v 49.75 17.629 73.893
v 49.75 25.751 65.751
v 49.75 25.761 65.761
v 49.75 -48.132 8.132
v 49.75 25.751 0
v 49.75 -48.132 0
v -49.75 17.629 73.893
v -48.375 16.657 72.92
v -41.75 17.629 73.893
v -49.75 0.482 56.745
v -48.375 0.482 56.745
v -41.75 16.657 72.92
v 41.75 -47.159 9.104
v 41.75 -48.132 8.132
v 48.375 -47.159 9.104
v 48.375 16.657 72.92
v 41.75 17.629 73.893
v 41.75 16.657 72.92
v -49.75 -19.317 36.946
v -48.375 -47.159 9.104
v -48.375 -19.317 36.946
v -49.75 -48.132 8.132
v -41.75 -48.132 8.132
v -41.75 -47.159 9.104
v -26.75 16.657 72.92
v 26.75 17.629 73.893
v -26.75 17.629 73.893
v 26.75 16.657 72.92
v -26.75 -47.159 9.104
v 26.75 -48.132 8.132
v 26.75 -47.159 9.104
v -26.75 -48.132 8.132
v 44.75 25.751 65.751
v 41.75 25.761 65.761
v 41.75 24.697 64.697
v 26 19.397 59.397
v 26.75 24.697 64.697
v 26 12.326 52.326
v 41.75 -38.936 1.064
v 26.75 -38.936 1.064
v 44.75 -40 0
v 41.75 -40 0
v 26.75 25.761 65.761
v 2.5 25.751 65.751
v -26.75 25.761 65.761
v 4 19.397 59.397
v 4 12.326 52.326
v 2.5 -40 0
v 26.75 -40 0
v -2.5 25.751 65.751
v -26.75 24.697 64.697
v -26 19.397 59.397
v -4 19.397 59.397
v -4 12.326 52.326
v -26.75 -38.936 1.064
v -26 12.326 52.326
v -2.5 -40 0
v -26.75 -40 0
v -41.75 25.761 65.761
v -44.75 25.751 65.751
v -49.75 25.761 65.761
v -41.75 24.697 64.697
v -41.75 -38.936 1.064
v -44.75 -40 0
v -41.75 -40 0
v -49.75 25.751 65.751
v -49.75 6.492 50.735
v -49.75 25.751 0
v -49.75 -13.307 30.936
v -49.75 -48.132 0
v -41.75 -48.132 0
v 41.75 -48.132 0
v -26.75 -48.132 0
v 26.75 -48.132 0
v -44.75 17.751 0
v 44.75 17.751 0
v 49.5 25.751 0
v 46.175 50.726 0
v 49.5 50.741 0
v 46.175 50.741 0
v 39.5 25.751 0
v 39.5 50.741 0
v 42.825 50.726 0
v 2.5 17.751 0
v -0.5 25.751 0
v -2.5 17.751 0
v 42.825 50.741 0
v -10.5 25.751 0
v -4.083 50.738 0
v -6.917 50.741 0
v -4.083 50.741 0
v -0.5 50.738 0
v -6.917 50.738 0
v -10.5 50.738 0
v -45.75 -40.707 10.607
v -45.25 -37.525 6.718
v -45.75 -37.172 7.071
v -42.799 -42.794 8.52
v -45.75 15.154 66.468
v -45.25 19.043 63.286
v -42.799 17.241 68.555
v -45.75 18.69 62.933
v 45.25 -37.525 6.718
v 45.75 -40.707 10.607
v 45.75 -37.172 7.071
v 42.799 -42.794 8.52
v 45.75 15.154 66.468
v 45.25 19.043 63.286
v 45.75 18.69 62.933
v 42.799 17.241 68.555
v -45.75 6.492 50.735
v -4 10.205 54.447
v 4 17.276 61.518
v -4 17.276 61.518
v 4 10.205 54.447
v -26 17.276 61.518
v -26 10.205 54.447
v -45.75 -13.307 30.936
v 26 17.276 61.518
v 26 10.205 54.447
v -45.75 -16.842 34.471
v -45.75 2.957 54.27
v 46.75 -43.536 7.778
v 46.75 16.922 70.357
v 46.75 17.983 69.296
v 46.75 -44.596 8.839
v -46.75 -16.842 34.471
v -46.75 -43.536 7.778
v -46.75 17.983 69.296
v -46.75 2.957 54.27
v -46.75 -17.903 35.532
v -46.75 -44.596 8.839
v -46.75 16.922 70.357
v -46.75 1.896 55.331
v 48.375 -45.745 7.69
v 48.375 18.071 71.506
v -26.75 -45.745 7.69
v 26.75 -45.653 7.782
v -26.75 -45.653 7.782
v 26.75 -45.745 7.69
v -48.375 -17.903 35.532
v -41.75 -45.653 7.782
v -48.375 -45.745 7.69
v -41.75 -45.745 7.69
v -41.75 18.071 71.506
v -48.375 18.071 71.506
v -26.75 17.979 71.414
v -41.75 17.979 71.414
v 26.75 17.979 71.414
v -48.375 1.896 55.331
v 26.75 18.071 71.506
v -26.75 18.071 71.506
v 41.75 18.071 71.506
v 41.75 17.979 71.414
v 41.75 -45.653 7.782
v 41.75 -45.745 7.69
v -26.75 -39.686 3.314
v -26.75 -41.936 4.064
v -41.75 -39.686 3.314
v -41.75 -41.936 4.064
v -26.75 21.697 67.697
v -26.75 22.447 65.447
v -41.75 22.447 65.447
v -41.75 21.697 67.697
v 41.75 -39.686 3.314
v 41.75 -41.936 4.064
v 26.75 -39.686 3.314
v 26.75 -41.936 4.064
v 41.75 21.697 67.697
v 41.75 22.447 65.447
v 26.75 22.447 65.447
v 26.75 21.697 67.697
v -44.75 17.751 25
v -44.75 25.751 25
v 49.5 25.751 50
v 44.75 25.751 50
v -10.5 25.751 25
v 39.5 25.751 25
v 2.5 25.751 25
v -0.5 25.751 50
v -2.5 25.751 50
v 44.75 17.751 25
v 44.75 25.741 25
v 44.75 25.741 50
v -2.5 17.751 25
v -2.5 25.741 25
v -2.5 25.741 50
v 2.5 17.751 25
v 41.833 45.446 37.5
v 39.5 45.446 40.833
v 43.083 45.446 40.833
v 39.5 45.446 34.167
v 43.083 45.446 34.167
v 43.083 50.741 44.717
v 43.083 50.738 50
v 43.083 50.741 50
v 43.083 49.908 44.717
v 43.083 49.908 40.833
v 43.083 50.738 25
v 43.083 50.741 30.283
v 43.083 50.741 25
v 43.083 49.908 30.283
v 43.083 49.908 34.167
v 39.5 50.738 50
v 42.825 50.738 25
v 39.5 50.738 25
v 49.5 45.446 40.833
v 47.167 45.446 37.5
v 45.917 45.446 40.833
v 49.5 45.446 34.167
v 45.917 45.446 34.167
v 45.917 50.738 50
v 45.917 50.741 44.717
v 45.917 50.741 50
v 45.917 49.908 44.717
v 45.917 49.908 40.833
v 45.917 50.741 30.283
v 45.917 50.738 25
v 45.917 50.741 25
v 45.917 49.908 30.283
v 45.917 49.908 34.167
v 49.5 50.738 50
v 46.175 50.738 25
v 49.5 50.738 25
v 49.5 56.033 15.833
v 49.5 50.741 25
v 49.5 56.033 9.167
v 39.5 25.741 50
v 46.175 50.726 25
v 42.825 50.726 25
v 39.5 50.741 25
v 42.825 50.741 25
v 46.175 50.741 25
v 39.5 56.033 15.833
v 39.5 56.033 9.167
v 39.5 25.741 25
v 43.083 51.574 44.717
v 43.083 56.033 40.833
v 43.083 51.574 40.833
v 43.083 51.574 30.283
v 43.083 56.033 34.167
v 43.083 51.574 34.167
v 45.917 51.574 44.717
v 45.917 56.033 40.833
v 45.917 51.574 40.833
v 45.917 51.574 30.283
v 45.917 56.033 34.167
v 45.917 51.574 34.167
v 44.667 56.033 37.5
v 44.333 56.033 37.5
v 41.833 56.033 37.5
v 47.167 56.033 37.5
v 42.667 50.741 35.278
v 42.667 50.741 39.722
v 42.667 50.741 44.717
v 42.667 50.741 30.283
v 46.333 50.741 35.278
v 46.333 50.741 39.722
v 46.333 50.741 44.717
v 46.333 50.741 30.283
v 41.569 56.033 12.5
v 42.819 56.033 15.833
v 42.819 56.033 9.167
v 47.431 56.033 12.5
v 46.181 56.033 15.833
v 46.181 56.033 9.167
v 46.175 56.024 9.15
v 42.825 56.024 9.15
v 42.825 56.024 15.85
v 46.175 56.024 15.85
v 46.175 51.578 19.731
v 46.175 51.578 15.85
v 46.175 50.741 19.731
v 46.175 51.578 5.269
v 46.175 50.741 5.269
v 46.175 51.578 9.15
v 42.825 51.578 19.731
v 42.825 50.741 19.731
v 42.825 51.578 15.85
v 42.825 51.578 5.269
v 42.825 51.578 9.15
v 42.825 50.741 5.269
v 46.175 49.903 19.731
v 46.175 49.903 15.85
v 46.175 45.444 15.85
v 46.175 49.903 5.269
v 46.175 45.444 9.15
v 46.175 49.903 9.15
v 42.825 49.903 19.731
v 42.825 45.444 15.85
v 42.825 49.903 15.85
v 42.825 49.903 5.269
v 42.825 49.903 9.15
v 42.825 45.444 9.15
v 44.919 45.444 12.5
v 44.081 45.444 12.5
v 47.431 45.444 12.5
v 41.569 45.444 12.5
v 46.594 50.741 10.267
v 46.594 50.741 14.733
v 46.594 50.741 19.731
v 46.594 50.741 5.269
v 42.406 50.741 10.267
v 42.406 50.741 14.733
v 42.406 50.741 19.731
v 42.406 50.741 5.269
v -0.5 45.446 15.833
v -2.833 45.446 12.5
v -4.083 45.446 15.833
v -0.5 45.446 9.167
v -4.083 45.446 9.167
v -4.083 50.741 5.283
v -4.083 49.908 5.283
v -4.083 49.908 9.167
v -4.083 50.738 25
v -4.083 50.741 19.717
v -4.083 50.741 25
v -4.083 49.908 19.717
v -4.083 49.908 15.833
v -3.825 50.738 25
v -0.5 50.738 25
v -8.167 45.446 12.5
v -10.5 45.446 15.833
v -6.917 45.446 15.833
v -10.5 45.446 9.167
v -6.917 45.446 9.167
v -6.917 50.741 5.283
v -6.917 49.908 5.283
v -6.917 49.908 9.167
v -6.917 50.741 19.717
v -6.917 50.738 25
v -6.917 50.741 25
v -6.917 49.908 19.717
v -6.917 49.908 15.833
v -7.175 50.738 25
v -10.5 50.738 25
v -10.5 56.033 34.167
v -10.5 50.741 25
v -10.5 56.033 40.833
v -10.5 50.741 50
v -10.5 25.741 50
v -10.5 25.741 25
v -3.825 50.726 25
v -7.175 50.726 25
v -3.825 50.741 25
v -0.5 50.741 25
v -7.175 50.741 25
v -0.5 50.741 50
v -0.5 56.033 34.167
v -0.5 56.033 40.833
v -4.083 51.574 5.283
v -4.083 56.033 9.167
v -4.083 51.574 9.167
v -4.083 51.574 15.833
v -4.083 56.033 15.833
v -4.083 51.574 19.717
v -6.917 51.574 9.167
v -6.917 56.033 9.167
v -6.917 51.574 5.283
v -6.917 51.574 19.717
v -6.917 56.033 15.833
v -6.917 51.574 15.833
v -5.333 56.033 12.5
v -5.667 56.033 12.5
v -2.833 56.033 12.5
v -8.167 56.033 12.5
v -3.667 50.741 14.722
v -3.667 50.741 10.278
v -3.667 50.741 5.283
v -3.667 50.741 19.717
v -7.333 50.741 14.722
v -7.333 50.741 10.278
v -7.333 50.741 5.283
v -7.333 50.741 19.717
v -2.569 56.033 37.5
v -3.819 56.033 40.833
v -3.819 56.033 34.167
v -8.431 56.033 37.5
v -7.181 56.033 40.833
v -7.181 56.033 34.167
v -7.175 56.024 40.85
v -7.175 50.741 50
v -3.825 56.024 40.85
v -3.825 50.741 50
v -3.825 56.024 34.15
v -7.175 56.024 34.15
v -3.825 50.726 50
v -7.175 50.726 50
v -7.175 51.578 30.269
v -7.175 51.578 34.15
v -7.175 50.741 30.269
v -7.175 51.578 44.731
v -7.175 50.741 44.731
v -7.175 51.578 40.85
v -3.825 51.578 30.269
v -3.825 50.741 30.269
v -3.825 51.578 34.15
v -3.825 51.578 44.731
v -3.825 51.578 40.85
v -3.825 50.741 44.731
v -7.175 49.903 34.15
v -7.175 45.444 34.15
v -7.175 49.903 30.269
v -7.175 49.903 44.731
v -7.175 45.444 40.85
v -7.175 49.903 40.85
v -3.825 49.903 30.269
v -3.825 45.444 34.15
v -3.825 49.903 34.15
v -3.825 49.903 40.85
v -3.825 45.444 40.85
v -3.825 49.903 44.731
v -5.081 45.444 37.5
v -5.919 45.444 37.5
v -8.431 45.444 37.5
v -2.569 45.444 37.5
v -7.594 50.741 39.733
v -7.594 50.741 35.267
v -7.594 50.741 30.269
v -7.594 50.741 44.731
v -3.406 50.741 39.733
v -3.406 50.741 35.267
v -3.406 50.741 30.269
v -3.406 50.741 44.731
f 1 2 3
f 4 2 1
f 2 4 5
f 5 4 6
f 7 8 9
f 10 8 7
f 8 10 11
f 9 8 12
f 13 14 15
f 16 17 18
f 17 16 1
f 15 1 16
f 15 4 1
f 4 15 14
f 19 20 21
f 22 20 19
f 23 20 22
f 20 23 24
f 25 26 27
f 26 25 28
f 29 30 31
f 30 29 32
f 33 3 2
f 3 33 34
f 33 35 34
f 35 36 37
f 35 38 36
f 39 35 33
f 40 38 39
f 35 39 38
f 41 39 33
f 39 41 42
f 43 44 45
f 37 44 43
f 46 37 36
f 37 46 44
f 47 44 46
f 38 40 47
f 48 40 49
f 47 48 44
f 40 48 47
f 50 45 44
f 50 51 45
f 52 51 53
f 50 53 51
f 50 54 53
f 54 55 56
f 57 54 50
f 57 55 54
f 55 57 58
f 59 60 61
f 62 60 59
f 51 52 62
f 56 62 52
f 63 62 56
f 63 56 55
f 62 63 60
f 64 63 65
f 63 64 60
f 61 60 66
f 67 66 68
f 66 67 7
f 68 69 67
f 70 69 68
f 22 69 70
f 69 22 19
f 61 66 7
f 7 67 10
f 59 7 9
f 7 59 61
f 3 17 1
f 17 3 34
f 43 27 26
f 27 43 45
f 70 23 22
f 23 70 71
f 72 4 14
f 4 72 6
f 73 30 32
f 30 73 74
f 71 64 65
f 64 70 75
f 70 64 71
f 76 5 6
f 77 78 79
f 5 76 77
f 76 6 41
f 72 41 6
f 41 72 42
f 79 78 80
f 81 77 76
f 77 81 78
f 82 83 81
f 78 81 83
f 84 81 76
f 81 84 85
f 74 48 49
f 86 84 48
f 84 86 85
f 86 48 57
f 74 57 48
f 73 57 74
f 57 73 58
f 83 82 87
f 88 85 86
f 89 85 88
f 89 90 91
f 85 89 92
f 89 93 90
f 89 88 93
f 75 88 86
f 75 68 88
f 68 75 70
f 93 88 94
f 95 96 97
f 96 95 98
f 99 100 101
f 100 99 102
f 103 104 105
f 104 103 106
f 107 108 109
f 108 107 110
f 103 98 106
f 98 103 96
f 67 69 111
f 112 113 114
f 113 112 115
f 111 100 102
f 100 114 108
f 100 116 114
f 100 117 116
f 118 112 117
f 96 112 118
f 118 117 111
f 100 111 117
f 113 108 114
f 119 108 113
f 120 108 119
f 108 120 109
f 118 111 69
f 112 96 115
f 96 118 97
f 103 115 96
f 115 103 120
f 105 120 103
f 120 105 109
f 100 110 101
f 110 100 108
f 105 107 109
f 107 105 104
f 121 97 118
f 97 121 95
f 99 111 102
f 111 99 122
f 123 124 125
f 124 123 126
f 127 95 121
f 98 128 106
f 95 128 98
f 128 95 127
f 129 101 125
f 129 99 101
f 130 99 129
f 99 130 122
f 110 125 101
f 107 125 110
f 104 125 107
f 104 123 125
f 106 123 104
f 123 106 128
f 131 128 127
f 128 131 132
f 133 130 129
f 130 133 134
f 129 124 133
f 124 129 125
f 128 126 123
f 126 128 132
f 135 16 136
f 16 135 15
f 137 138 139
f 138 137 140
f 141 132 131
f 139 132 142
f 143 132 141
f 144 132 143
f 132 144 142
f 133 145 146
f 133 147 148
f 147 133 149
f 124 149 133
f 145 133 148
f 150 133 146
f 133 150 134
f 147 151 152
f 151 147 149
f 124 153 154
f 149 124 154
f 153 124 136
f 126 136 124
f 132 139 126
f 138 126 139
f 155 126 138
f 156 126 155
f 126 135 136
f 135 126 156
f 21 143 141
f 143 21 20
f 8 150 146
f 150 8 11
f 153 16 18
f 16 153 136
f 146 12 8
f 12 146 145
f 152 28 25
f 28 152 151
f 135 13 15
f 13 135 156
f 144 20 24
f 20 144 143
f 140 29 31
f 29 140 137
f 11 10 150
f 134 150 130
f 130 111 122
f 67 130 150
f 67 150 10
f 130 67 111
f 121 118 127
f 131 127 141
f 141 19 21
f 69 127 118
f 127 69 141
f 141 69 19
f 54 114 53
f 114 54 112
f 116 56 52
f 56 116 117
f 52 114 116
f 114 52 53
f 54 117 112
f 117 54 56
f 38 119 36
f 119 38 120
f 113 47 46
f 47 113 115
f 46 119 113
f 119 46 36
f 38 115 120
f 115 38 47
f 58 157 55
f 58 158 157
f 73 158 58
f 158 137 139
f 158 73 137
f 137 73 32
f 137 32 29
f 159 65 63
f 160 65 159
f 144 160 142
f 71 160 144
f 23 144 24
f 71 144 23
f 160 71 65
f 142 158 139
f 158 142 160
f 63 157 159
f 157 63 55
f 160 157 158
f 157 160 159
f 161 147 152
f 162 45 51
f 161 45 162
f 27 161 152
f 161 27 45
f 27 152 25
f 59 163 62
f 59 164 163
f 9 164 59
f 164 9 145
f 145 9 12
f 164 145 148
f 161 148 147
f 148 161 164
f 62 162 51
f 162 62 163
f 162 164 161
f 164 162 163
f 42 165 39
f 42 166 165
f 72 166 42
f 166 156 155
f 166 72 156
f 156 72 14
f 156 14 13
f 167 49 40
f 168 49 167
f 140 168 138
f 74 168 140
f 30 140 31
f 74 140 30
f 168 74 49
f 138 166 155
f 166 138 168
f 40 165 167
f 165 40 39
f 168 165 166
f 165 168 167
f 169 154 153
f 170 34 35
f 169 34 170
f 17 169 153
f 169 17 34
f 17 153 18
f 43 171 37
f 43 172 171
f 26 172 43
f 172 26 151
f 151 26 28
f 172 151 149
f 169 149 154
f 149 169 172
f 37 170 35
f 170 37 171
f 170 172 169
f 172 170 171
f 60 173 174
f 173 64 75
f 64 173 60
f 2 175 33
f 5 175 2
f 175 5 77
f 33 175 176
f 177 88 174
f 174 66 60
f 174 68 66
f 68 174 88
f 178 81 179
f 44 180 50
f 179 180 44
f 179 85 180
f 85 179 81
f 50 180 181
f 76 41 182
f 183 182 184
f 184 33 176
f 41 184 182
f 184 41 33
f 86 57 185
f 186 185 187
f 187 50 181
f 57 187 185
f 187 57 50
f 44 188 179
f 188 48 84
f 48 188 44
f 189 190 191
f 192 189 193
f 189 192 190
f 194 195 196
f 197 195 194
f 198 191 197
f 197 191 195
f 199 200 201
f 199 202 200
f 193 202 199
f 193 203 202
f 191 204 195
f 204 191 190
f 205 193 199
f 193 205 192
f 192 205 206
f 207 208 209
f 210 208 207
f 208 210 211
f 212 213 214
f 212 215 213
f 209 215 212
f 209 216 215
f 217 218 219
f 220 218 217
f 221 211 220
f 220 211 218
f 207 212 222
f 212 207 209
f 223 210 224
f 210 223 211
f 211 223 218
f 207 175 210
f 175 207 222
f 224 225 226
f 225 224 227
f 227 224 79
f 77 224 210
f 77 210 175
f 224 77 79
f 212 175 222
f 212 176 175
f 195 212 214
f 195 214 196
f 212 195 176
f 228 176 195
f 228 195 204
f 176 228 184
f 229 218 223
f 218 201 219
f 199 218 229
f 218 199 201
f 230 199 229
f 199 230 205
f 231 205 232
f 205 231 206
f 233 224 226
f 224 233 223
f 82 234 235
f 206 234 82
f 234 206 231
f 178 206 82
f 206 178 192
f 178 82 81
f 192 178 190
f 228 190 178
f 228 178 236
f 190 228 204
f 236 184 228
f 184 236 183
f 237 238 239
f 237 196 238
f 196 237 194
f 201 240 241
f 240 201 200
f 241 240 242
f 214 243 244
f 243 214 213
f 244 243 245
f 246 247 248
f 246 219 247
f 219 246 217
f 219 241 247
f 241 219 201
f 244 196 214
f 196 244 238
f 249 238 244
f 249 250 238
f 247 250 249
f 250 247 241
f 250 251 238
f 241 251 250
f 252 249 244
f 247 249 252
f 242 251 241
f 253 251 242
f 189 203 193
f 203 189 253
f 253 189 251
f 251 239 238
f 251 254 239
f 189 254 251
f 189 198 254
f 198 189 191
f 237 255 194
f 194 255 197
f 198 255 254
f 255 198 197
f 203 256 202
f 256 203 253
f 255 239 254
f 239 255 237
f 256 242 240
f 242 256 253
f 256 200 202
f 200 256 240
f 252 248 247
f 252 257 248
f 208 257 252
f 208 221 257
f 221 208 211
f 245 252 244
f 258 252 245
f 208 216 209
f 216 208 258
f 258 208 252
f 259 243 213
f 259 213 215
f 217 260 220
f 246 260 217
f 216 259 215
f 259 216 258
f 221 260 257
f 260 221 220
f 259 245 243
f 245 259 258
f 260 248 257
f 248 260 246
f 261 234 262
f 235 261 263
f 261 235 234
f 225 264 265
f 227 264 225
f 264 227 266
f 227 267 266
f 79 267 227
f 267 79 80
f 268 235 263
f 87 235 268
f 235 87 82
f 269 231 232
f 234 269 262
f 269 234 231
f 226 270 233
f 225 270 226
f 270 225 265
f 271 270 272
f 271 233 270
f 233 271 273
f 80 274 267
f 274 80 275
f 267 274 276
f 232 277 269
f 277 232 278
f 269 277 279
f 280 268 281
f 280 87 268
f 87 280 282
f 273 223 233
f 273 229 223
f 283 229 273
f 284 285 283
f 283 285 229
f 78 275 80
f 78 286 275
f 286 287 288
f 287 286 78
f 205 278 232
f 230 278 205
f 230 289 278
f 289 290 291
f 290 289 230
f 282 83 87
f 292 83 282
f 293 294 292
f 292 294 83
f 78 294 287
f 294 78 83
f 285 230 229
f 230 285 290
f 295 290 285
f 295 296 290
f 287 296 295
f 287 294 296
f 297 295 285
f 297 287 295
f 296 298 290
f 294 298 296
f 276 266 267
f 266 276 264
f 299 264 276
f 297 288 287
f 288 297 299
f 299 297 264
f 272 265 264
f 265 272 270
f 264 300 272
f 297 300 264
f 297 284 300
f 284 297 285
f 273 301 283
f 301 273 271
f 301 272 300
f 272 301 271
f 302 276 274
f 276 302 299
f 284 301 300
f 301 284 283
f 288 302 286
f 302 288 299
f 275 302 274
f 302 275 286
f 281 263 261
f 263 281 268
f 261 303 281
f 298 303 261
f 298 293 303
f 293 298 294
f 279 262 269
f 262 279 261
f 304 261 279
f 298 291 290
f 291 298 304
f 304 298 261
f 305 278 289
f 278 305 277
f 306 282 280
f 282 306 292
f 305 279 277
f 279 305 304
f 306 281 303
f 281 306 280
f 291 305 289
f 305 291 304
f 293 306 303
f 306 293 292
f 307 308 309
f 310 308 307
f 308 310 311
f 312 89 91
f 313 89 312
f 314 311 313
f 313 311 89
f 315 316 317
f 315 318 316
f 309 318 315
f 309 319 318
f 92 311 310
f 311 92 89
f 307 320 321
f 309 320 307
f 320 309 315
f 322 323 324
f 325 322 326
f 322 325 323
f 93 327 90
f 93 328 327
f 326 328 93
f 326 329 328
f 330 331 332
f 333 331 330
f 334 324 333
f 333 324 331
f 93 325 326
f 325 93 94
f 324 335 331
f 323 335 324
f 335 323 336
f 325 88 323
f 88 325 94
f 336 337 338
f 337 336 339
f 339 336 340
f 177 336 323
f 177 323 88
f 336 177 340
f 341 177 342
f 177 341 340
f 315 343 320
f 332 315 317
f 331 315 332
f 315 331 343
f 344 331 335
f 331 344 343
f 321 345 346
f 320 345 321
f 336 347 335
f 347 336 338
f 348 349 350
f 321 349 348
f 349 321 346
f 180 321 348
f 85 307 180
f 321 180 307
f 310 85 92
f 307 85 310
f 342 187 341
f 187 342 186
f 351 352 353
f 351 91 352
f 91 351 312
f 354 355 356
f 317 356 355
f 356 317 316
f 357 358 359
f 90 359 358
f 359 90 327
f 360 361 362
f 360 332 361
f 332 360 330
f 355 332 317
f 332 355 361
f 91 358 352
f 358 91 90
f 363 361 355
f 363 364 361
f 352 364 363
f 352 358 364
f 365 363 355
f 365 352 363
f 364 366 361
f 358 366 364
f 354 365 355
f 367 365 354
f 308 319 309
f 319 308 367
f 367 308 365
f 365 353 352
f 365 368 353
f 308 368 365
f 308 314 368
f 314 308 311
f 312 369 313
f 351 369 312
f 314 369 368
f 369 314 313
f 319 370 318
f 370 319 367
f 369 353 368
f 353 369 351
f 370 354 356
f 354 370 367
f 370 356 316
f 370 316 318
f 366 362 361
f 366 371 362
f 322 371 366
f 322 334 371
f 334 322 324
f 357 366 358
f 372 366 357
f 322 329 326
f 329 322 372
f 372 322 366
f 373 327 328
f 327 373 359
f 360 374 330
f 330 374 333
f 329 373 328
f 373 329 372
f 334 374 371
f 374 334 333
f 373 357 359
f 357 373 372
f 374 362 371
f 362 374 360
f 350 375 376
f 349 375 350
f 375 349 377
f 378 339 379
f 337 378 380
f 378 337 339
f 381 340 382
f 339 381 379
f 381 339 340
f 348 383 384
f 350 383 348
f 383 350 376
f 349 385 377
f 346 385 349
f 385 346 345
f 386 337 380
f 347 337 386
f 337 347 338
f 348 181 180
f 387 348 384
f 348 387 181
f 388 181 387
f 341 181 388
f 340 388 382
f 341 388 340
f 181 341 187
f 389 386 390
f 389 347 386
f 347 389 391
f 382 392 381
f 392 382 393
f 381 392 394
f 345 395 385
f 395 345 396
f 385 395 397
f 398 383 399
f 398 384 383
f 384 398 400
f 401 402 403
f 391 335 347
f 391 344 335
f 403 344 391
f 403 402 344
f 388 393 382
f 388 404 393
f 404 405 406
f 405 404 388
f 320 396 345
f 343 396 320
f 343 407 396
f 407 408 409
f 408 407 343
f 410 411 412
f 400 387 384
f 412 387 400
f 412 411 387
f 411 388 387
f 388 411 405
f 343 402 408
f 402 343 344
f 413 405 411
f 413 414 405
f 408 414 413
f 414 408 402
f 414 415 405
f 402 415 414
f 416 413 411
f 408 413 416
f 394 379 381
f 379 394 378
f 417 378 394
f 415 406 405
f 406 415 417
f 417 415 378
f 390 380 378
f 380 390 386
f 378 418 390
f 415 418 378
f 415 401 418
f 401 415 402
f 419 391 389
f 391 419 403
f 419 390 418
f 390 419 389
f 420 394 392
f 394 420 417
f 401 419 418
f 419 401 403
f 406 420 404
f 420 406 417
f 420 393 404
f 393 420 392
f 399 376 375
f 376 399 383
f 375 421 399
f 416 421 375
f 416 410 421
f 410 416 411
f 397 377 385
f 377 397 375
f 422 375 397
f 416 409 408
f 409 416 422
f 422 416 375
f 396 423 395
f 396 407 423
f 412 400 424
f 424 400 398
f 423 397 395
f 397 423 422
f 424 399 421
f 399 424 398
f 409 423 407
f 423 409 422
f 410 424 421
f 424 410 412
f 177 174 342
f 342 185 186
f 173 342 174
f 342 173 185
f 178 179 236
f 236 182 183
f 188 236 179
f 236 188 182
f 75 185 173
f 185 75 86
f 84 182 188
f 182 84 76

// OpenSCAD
include <config.scad>
use <GDMUtils.scad>
use <joiners.scad>


case_wall = 3;

// LCD display
lcd_width = 79;
lcd_height = 52;
lcd_hoff = 0;
lcd_voff = 8.25;

// SD card slot (left side)
sd_slot_width = 28;
sd_slot_height = 5;
sd_slot_voff = 8.25;

// Full board
board_width = 93.5;
board_height = 87;
board_depth = 10;
board_thick = 1.5;
board_top_clearance = 10;
board_top_standoff = 4.5;
board_bot_standoff = 0;

// Connectors
conn_slot_width = 52;
conn_slot_height = 10;
conn_slot_gap = 8;
conn_slot_voff = 32.5;
conn_slot_hoff = 0;

// Control Dial
dial_diam = 8;
dial_height = 7;
dial_voff = -35.25;
dial_hoff = 36.5;

// Buzzer
buzzer_diam = 2;
buzzer_height = 9.5;
buzzer_voff = -35.25;
buzzer_hoff = 19;

// Reset
reset_diam = 6;
reset_height = 5;
reset_voff = -35.5;
reset_hoff = 3.5;


$fa = 2;
$fs = 1.5;


module reset_button(slop=0) {
	h = board_top_clearance + case_wall - reset_height + slop;
	up(h+1) {
		zflip() {
			cylinder(d=reset_diam+2+slop, h=h-3, center=false);
			cylinder(d=reset_diam+slop, h=h+1, center=false);
			up(h-3) cylinder(d1=reset_diam+2+slop, d2=reset_diam+slop, h=2, center=false);
		}
	}
}
//!reset_button();


module rrd_graphic_lcd_case_top()
{
	tab_h = sd_slot_height + case_wall + board_thick + 2;
	h = board_top_clearance + case_wall;

	difference() {
		union() {
			difference() {
				// Outer shell.
				union() {
					upcube([board_width+case_wall*2, board_height+case_wall*2, h-2]);
					upcube([board_width+case_wall-printer_slop, board_height+case_wall-printer_slop, h]);

					// SD slot backing
					back(sd_slot_voff) {
						right(board_width/2+case_wall/2) {
							upcube([case_wall, sd_slot_width-printer_slop*2, h]);
						}
					}
				}
				up(case_wall) {
					// Board supports
					difference() {
						upcube([board_width, board_height, h]);
						xspread(board_width) {
							yspread(board_height) {
								chamfer_mask_z(l=h*3, chamfer=4.0);
							}
						}
					}
					xspread(board_width-4) {
						// Clear upper standoff corners
						up(board_top_clearance-board_top_standoff-0.01) {
							back(board_height/2-4/2) {
								upcube([4, 4, h]);
							}
						}

						// Clear lower standoff corners
						up(board_top_clearance-board_bot_standoff-0.01) {
							fwd(board_height/2-4/2) {
								upcube([4, 4, h]);
							}
						}
					}
				}

				// LCD access
				back(lcd_voff) {
					right(lcd_hoff) {
						cube([lcd_width, lcd_height, h*2], center=true);
					}
				}
			}

			// Clip tabs
			up(h-2-0.01) {
				xspread(board_width-15-2*5) {
					yflip_copy() {
						fwd((board_height+case_wall-0.01)/2) {
							fwd(case_wall/2/2) down(0.5) upcube([15-0.5, case_wall/2, tab_h]);
							up(tab_h - case_wall*sqrt(2)/2) {
								yscale(0.5) {
									xrot(45) cube([15-0.5, case_wall, case_wall], center=true);
								}
							}
						}
					}
				}
			}

			// Rotary dial support
			left(dial_hoff) {
				back(dial_voff) {
					up(case_wall-0.01) {
						cylinder(d=dial_diam+4, h=board_top_clearance-dial_height, center=false);
					}
				}
			}

			// Reset button support
			left(reset_hoff) {
				back(reset_voff) {
					up(case_wall-0.01) {
						cylinder(d=reset_diam+6, h=board_top_clearance-reset_height, center=false);
					}
				}
			}
		}

		// Rotary dial hole
		left(dial_hoff) {
			back(dial_voff) {
				cylinder(d=dial_diam, h=h*3, center=true);
			}
		}

		// Buzzer sound hole.
		left(buzzer_hoff) {
			back(buzzer_voff) {
				cylinder(d=buzzer_diam, h=h*3, center=true);
			}
		}

		// Reset button hole
		left(reset_hoff) {
			back(reset_voff) {
				down(1+printer_slop/2) {
					reset_button(slop=3*printer_slop);
				}
			}
		}
	}

	// Reset button
	left(reset_hoff) {
		back(reset_voff) {
			reset_button(slop=0);
		}
	}
}
//!rrd_graphic_lcd_case_top();



module rrd_graphic_lcd_case_bottom()
{
	h = sd_slot_height + case_wall + board_thick + 2;
	joiner_length = 25;

	union() {
		xrot(45) {
			back(board_height/2+case_wall) {
				difference() {
					union() {
						upcube([board_width+case_wall*2, board_height+case_wall*2, h]);
						up(h/2) {
							fwd(board_height/2+case_wall) {
								xrot(45) cube([board_width+case_wall*2, h/sqrt(2), h/sqrt(2)], center=true);
							}
						}
					}
					up(case_wall) {
						difference() {
							trapezoid([board_width-2, board_height-sd_slot_height-2], [board_width-2, board_height-2], h-case_wall-2-board_thick+0.1, center=false);
							xspread(board_width-2) {
								yspread(board_height-2) {
									chamfer_mask_z(l=h+1, chamfer=3.0);
								}
							}
						}
						up(sd_slot_height) {
							upcube([board_width, board_height, h]);
							up(board_thick) {
								upcube([board_width+case_wall+printer_slop, board_height+case_wall+printer_slop, h]);
							}
						}
						back(sd_slot_voff) {
							left(board_width/2) {
								upcube([board_width/2, sd_slot_width, h]);
							}
						}
					}
					back(conn_slot_voff) {
						right(conn_slot_hoff) {
							xspread((conn_slot_width-conn_slot_gap)/2+conn_slot_gap) {
								cube([(conn_slot_width-conn_slot_gap)/2, conn_slot_height, h*2], center=true);
							}
						}
					}
					xspread(board_width-15-2*5) {
						yflip_copy() {
							fwd((board_height+case_wall-0.01)/2) {
								fwd(h/2) down(0.5) upcube([15, h, h+1]);
								up(case_wall*sqrt(2)/2) {
									yscale(0.5) {
										xrot(45) cube([15, case_wall, case_wall], center=true);
									}
								}
							}
						}
					}
				}
			}
		}
		back((board_height+2*case_wall)/sqrt(2)-0.01) {
			left(5/2) {
				xspread(board_width+2*case_wall-5) {
					zrot(-90) right_triangle([(board_height+2*case_wall)/sqrt(2), 5, (board_height+2*case_wall)/sqrt(2)], center=false);
				}
				right(conn_slot_hoff) zrot(-90) right_triangle([(board_height+2*case_wall)/sqrt(2), 5, (board_height+2*case_wall)/sqrt(2)], center=false);
			}
			fwd(8/2) upcube([board_width+2*case_wall, 8, rail_height/2]);
			right(platform_length/2/2-joiner_width/2-0.5) {
				back(joiner_length-0.01) {
					up(rail_height/2) joiner_pair(spacing=platform_length/2, h=rail_height, w=joiner_width, l=joiner_length, a=joiner_angle);
				}
			}
		}
	}
}
//!rrd_graphic_lcd_case_bottom();



module rrd_graphic_lcd_base_parts() { // make me
	fwd(40) rrd_graphic_lcd_case_bottom();
}



rrd_graphic_lcd_base_parts();



// vim: noexpandtab tabstop=4 shiftwidth=4 softtabstop=4 nowrap
